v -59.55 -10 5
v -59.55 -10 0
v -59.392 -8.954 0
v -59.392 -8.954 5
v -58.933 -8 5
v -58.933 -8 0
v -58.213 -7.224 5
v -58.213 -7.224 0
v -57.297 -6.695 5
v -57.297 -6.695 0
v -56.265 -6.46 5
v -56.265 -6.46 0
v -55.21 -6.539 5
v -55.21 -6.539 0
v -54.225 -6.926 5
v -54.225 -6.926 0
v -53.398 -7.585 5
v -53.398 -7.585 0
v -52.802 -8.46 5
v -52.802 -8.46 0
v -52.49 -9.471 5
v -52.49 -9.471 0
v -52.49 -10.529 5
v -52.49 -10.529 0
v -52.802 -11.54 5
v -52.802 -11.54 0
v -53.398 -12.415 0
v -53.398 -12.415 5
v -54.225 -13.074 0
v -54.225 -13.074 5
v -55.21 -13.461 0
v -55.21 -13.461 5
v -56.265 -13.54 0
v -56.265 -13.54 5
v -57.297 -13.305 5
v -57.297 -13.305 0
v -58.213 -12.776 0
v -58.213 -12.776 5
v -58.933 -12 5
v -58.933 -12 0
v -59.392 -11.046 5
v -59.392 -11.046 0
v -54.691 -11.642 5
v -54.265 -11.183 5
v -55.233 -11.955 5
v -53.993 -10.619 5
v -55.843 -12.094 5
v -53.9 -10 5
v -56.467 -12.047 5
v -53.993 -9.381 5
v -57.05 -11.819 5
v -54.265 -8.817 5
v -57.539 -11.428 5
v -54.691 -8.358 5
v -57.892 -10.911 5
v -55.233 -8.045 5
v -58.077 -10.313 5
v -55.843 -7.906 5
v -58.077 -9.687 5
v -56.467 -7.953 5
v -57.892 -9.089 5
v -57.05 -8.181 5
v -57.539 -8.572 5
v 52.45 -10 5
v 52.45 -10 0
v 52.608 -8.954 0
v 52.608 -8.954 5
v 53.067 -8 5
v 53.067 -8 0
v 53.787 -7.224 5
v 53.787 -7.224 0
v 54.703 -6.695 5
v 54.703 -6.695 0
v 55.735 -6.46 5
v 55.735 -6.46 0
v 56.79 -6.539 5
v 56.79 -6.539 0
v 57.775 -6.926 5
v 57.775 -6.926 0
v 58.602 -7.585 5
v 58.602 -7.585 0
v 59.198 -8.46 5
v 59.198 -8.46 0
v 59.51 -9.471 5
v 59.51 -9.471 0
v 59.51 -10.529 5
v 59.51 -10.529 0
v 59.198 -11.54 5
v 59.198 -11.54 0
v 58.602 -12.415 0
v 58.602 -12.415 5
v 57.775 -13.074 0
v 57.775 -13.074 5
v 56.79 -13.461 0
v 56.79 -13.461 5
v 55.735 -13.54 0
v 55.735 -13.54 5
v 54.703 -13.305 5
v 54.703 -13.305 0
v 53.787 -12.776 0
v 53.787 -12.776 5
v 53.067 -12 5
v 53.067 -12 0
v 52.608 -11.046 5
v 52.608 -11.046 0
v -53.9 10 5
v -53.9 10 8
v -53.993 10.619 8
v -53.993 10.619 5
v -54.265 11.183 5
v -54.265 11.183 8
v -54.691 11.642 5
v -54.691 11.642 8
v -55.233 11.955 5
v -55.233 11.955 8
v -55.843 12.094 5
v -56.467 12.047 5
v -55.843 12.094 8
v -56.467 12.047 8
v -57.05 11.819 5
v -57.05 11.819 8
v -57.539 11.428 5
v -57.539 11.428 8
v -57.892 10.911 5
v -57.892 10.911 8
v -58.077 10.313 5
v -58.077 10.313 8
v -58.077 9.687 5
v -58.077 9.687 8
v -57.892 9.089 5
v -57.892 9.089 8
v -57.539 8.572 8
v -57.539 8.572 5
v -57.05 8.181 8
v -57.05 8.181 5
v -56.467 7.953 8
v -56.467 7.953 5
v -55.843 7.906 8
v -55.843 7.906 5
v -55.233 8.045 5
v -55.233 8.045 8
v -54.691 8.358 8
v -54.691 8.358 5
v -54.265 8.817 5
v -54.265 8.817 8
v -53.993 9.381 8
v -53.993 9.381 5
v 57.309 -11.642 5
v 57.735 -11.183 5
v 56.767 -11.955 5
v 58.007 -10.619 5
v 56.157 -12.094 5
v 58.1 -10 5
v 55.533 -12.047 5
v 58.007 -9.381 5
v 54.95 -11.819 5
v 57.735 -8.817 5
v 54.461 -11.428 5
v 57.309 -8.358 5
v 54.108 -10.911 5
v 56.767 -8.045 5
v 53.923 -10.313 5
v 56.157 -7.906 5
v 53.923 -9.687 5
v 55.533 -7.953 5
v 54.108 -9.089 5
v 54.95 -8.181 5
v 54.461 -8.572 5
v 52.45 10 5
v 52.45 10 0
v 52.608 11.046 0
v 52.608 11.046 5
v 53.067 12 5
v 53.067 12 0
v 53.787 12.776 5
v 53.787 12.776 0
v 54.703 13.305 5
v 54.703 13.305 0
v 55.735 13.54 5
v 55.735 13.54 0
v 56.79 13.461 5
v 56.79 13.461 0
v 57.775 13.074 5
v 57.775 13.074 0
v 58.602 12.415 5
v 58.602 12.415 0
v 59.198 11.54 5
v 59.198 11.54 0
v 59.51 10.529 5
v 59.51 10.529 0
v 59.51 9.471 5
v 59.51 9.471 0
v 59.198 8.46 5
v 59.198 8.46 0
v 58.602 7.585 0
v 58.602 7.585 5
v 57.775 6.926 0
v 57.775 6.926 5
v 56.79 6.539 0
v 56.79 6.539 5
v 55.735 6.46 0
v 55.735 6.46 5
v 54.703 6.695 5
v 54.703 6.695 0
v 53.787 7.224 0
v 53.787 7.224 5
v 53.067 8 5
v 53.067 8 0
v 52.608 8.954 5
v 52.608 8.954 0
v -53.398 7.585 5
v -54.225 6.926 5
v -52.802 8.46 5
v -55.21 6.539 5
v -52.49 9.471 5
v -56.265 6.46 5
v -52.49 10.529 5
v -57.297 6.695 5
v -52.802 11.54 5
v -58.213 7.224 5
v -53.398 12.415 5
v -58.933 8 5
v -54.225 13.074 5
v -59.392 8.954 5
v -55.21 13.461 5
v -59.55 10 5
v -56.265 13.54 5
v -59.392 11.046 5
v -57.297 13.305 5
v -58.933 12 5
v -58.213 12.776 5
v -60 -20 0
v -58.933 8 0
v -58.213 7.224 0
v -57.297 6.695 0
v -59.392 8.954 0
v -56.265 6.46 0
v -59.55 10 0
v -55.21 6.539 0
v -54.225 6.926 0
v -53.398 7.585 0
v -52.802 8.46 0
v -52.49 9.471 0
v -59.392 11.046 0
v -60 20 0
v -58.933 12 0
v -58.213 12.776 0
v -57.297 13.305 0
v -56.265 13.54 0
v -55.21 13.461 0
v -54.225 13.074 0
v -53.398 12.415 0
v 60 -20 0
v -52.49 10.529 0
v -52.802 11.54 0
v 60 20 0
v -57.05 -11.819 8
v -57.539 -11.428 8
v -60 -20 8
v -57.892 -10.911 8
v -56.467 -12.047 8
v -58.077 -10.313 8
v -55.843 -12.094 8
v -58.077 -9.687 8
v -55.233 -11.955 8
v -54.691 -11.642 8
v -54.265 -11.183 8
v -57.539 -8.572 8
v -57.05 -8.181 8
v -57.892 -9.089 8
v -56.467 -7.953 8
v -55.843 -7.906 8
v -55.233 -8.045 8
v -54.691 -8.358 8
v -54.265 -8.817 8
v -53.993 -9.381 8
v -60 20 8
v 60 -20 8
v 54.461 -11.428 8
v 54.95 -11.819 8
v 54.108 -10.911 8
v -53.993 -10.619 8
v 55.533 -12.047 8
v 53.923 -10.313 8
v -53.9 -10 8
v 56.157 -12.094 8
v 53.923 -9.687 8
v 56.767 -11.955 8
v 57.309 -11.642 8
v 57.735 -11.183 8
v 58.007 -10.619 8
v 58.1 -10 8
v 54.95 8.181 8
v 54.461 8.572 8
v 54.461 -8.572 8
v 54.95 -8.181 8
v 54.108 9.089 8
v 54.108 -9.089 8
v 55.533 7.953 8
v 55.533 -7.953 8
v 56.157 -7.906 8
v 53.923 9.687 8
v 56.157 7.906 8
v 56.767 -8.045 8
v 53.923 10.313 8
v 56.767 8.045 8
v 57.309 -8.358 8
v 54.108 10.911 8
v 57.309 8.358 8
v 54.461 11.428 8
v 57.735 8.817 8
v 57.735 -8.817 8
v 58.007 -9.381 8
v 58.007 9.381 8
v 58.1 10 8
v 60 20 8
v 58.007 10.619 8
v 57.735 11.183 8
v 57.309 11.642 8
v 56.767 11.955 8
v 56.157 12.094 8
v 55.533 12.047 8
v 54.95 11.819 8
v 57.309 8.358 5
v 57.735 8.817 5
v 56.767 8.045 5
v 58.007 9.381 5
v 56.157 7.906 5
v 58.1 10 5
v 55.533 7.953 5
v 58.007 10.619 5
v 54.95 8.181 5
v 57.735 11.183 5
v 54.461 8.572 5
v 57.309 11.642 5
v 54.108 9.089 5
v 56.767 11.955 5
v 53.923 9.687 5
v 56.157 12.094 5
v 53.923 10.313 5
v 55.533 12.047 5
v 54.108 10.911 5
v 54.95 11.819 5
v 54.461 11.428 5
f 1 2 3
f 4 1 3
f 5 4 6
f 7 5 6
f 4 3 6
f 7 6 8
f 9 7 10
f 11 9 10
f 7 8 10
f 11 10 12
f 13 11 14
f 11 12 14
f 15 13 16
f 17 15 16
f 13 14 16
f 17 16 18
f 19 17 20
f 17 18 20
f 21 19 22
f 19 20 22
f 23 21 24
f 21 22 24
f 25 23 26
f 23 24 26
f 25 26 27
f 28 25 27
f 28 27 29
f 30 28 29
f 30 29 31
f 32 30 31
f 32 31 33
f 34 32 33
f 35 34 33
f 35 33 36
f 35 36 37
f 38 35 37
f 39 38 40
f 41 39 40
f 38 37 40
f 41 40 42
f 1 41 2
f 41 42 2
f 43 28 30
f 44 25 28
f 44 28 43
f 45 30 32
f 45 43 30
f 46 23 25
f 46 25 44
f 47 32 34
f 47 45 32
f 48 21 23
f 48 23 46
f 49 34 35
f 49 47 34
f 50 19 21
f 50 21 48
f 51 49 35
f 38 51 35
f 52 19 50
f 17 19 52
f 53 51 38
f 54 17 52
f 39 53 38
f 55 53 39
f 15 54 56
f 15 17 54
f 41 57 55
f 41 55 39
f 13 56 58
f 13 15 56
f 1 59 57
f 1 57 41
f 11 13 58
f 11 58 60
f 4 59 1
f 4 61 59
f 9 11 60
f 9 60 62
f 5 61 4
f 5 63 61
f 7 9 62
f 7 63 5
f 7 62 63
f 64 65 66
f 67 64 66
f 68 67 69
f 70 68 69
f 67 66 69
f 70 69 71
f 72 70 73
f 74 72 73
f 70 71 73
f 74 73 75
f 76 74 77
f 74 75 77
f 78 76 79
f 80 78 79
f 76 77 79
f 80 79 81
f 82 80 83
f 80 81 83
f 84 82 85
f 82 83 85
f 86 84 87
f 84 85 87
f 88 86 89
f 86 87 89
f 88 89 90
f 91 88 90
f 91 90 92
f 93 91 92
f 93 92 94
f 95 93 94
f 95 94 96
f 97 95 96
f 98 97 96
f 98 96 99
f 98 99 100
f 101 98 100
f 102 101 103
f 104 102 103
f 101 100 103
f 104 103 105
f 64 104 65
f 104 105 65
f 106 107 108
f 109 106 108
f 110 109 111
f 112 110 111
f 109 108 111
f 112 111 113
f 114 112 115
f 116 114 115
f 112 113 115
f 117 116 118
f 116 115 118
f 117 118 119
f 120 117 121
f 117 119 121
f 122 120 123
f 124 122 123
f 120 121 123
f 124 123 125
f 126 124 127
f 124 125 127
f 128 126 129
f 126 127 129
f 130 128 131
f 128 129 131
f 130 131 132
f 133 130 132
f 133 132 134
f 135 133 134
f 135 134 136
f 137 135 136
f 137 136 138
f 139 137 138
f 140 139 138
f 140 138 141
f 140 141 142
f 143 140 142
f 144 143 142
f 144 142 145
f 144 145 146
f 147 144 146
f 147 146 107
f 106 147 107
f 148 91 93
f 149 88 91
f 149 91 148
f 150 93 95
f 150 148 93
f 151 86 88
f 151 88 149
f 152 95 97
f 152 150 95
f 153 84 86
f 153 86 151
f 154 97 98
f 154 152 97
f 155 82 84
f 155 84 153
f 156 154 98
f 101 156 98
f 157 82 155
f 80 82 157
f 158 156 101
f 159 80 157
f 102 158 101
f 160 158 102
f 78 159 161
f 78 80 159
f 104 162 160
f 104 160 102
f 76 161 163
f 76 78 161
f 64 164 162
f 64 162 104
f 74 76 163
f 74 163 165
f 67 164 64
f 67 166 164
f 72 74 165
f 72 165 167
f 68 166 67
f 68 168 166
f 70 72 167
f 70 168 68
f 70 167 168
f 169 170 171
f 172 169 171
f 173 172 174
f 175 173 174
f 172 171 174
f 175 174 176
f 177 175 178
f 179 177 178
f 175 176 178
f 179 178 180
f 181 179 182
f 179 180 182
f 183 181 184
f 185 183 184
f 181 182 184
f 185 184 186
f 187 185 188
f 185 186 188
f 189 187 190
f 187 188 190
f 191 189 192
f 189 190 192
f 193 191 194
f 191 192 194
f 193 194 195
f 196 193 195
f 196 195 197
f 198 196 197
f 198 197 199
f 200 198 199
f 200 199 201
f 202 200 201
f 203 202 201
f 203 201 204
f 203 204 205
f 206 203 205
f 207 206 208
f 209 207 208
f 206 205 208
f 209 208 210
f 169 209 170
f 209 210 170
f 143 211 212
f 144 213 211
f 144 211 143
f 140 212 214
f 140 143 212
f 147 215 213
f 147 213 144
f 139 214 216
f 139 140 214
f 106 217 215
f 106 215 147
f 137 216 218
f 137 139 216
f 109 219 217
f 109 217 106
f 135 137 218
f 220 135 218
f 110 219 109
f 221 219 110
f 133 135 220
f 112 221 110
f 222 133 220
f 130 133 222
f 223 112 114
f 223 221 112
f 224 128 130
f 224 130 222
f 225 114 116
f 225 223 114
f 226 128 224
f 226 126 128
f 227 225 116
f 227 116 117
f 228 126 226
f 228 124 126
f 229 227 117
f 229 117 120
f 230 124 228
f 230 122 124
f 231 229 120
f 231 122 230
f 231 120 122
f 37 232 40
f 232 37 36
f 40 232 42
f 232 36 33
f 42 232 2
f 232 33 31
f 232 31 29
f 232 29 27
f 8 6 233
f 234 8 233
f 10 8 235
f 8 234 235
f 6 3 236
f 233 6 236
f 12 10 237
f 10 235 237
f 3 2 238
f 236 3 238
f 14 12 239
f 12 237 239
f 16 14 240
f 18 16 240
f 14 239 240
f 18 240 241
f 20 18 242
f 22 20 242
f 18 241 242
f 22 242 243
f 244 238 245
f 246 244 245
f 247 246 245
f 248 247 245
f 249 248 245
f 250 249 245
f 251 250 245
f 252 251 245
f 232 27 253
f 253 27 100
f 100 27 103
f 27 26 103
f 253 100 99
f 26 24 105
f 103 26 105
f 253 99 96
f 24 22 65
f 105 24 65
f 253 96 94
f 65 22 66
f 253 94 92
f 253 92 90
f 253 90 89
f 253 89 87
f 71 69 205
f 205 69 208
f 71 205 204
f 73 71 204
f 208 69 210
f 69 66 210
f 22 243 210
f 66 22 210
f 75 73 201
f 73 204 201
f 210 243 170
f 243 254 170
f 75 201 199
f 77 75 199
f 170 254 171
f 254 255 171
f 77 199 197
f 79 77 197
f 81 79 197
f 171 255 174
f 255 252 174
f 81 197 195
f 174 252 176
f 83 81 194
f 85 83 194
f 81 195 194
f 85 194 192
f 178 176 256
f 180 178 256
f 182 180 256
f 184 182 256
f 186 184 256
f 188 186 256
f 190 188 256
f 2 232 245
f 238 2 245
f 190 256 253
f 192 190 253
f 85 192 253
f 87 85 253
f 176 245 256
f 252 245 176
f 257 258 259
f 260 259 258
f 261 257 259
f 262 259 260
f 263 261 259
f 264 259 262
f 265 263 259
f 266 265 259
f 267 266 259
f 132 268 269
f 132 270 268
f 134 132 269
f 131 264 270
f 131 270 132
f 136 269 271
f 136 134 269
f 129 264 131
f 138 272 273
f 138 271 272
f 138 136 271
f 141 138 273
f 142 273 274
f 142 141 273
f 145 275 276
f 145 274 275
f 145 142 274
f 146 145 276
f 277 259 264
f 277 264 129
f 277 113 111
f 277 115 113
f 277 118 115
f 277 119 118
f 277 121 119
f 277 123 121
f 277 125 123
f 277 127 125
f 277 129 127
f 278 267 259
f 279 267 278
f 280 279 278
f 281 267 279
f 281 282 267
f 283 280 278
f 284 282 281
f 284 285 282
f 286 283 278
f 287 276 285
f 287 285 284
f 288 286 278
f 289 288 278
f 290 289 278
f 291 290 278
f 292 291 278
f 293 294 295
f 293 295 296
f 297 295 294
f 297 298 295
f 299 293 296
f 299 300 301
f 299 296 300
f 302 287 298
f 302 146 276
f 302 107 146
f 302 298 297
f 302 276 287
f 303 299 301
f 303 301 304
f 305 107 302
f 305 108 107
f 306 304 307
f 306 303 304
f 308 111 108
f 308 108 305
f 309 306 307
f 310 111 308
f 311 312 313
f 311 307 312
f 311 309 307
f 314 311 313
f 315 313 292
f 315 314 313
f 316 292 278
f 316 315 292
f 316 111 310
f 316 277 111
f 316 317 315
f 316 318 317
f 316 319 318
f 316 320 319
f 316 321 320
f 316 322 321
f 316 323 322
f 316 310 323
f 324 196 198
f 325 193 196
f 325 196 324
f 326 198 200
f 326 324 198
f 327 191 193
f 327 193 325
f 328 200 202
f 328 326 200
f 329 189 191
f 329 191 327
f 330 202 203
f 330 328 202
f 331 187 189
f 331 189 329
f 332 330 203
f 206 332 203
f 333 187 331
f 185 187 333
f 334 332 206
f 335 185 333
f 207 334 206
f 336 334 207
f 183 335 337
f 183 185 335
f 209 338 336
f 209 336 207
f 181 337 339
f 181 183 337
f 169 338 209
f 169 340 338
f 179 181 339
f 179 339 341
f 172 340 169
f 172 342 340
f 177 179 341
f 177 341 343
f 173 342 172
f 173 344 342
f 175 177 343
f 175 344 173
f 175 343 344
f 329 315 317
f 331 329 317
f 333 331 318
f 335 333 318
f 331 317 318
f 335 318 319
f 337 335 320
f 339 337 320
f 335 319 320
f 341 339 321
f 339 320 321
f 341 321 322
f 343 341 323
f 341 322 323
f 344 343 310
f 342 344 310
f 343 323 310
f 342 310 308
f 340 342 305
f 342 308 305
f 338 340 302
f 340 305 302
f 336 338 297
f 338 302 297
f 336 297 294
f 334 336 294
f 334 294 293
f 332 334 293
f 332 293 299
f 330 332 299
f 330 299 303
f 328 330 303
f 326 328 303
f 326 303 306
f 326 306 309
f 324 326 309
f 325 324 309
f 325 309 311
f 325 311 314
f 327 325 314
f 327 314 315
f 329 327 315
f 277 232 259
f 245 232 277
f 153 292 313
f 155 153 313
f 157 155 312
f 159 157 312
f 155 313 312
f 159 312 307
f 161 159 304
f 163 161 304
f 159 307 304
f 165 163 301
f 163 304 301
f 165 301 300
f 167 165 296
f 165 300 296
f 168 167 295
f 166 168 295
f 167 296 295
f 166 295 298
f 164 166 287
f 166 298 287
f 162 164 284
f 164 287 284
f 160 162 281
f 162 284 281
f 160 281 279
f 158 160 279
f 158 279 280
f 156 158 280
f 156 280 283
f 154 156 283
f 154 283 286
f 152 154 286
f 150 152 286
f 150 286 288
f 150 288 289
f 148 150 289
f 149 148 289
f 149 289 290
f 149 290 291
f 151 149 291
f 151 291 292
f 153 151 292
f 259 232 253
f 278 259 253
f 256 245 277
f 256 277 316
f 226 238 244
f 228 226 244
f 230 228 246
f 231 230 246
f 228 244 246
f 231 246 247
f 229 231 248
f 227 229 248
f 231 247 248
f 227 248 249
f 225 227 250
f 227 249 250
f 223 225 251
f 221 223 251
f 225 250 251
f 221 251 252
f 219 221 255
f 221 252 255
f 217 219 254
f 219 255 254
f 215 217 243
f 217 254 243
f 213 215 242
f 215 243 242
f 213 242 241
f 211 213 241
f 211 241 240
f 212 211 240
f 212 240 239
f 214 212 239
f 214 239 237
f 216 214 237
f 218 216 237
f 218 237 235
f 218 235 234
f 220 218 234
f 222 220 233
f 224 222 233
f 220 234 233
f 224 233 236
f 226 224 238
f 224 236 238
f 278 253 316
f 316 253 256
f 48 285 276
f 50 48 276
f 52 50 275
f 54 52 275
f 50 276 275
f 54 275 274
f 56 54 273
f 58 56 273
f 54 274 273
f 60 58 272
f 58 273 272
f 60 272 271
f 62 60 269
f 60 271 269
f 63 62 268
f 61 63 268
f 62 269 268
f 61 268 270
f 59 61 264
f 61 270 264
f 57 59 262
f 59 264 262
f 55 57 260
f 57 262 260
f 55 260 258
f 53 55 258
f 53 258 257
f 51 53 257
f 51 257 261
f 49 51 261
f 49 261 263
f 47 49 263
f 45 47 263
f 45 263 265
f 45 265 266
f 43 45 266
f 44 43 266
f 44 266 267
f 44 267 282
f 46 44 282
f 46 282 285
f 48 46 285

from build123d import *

# Parameters (mm, degrees)
SKETCH_1_W             = 120
SKETCH_1_H             = 40
EXTRUDE_1_DEPTH        = 8
SKETCH_2_R             = 2.1
CUT_EXTRUDE_1_DEPTH    = 50
PATTERN_LINEAR_2_COUNT = 2
PATTERN_LINEAR_2_PITCH = 112
SKETCH_3_R             = 3.55
CUT_EXTRUDE_2_DEPTH    = 5


with BuildPart() as part:
    # Эскиз1 → Бобышка-Вытянуть1 (new body)
    with BuildSketch(Plane.XY):
        Rectangle(SKETCH_1_W, SKETCH_1_H)
    extrude(amount=EXTRUDE_1_DEPTH)

    # Эскиз2 → Вырез-Вытянуть1 (cut)
    with BuildSketch(Plane.XY.offset(8)):
        with Locations((-56, 10)):
            Circle(SKETCH_2_R)
        with Locations((-56, -10)):
            Circle(SKETCH_2_R)
    cut_extrude_1 = extrude(amount=-CUT_EXTRUDE_1_DEPTH, mode=Mode.SUBTRACT)

    # Линейный массив2: Вырез-Вытянуть1 ×2
    with Locations(*[(i * PATTERN_LINEAR_2_PITCH, 0, 0) for i in range(1, PATTERN_LINEAR_2_COUNT)]):
        add(cut_extrude_1, mode=Mode.SUBTRACT)

    # Эскиз3 → Вырез-Вытянуть2 (cut)
    with BuildSketch(Plane(origin=(0, 0, 0), x_dir=(-1, 0, 0), z_dir=(0, 0, -1))):
        with Locations((-56, 10)):
            Circle(SKETCH_3_R)
        with Locations((-56, -10)):
            Circle(SKETCH_3_R)
        with Locations((56, 10)):
            Circle(SKETCH_3_R)
        with Locations((56, -10)):
            Circle(SKETCH_3_R)
    extrude(amount=-CUT_EXTRUDE_2_DEPTH, mode=Mode.SUBTRACT)


solid = part.part
